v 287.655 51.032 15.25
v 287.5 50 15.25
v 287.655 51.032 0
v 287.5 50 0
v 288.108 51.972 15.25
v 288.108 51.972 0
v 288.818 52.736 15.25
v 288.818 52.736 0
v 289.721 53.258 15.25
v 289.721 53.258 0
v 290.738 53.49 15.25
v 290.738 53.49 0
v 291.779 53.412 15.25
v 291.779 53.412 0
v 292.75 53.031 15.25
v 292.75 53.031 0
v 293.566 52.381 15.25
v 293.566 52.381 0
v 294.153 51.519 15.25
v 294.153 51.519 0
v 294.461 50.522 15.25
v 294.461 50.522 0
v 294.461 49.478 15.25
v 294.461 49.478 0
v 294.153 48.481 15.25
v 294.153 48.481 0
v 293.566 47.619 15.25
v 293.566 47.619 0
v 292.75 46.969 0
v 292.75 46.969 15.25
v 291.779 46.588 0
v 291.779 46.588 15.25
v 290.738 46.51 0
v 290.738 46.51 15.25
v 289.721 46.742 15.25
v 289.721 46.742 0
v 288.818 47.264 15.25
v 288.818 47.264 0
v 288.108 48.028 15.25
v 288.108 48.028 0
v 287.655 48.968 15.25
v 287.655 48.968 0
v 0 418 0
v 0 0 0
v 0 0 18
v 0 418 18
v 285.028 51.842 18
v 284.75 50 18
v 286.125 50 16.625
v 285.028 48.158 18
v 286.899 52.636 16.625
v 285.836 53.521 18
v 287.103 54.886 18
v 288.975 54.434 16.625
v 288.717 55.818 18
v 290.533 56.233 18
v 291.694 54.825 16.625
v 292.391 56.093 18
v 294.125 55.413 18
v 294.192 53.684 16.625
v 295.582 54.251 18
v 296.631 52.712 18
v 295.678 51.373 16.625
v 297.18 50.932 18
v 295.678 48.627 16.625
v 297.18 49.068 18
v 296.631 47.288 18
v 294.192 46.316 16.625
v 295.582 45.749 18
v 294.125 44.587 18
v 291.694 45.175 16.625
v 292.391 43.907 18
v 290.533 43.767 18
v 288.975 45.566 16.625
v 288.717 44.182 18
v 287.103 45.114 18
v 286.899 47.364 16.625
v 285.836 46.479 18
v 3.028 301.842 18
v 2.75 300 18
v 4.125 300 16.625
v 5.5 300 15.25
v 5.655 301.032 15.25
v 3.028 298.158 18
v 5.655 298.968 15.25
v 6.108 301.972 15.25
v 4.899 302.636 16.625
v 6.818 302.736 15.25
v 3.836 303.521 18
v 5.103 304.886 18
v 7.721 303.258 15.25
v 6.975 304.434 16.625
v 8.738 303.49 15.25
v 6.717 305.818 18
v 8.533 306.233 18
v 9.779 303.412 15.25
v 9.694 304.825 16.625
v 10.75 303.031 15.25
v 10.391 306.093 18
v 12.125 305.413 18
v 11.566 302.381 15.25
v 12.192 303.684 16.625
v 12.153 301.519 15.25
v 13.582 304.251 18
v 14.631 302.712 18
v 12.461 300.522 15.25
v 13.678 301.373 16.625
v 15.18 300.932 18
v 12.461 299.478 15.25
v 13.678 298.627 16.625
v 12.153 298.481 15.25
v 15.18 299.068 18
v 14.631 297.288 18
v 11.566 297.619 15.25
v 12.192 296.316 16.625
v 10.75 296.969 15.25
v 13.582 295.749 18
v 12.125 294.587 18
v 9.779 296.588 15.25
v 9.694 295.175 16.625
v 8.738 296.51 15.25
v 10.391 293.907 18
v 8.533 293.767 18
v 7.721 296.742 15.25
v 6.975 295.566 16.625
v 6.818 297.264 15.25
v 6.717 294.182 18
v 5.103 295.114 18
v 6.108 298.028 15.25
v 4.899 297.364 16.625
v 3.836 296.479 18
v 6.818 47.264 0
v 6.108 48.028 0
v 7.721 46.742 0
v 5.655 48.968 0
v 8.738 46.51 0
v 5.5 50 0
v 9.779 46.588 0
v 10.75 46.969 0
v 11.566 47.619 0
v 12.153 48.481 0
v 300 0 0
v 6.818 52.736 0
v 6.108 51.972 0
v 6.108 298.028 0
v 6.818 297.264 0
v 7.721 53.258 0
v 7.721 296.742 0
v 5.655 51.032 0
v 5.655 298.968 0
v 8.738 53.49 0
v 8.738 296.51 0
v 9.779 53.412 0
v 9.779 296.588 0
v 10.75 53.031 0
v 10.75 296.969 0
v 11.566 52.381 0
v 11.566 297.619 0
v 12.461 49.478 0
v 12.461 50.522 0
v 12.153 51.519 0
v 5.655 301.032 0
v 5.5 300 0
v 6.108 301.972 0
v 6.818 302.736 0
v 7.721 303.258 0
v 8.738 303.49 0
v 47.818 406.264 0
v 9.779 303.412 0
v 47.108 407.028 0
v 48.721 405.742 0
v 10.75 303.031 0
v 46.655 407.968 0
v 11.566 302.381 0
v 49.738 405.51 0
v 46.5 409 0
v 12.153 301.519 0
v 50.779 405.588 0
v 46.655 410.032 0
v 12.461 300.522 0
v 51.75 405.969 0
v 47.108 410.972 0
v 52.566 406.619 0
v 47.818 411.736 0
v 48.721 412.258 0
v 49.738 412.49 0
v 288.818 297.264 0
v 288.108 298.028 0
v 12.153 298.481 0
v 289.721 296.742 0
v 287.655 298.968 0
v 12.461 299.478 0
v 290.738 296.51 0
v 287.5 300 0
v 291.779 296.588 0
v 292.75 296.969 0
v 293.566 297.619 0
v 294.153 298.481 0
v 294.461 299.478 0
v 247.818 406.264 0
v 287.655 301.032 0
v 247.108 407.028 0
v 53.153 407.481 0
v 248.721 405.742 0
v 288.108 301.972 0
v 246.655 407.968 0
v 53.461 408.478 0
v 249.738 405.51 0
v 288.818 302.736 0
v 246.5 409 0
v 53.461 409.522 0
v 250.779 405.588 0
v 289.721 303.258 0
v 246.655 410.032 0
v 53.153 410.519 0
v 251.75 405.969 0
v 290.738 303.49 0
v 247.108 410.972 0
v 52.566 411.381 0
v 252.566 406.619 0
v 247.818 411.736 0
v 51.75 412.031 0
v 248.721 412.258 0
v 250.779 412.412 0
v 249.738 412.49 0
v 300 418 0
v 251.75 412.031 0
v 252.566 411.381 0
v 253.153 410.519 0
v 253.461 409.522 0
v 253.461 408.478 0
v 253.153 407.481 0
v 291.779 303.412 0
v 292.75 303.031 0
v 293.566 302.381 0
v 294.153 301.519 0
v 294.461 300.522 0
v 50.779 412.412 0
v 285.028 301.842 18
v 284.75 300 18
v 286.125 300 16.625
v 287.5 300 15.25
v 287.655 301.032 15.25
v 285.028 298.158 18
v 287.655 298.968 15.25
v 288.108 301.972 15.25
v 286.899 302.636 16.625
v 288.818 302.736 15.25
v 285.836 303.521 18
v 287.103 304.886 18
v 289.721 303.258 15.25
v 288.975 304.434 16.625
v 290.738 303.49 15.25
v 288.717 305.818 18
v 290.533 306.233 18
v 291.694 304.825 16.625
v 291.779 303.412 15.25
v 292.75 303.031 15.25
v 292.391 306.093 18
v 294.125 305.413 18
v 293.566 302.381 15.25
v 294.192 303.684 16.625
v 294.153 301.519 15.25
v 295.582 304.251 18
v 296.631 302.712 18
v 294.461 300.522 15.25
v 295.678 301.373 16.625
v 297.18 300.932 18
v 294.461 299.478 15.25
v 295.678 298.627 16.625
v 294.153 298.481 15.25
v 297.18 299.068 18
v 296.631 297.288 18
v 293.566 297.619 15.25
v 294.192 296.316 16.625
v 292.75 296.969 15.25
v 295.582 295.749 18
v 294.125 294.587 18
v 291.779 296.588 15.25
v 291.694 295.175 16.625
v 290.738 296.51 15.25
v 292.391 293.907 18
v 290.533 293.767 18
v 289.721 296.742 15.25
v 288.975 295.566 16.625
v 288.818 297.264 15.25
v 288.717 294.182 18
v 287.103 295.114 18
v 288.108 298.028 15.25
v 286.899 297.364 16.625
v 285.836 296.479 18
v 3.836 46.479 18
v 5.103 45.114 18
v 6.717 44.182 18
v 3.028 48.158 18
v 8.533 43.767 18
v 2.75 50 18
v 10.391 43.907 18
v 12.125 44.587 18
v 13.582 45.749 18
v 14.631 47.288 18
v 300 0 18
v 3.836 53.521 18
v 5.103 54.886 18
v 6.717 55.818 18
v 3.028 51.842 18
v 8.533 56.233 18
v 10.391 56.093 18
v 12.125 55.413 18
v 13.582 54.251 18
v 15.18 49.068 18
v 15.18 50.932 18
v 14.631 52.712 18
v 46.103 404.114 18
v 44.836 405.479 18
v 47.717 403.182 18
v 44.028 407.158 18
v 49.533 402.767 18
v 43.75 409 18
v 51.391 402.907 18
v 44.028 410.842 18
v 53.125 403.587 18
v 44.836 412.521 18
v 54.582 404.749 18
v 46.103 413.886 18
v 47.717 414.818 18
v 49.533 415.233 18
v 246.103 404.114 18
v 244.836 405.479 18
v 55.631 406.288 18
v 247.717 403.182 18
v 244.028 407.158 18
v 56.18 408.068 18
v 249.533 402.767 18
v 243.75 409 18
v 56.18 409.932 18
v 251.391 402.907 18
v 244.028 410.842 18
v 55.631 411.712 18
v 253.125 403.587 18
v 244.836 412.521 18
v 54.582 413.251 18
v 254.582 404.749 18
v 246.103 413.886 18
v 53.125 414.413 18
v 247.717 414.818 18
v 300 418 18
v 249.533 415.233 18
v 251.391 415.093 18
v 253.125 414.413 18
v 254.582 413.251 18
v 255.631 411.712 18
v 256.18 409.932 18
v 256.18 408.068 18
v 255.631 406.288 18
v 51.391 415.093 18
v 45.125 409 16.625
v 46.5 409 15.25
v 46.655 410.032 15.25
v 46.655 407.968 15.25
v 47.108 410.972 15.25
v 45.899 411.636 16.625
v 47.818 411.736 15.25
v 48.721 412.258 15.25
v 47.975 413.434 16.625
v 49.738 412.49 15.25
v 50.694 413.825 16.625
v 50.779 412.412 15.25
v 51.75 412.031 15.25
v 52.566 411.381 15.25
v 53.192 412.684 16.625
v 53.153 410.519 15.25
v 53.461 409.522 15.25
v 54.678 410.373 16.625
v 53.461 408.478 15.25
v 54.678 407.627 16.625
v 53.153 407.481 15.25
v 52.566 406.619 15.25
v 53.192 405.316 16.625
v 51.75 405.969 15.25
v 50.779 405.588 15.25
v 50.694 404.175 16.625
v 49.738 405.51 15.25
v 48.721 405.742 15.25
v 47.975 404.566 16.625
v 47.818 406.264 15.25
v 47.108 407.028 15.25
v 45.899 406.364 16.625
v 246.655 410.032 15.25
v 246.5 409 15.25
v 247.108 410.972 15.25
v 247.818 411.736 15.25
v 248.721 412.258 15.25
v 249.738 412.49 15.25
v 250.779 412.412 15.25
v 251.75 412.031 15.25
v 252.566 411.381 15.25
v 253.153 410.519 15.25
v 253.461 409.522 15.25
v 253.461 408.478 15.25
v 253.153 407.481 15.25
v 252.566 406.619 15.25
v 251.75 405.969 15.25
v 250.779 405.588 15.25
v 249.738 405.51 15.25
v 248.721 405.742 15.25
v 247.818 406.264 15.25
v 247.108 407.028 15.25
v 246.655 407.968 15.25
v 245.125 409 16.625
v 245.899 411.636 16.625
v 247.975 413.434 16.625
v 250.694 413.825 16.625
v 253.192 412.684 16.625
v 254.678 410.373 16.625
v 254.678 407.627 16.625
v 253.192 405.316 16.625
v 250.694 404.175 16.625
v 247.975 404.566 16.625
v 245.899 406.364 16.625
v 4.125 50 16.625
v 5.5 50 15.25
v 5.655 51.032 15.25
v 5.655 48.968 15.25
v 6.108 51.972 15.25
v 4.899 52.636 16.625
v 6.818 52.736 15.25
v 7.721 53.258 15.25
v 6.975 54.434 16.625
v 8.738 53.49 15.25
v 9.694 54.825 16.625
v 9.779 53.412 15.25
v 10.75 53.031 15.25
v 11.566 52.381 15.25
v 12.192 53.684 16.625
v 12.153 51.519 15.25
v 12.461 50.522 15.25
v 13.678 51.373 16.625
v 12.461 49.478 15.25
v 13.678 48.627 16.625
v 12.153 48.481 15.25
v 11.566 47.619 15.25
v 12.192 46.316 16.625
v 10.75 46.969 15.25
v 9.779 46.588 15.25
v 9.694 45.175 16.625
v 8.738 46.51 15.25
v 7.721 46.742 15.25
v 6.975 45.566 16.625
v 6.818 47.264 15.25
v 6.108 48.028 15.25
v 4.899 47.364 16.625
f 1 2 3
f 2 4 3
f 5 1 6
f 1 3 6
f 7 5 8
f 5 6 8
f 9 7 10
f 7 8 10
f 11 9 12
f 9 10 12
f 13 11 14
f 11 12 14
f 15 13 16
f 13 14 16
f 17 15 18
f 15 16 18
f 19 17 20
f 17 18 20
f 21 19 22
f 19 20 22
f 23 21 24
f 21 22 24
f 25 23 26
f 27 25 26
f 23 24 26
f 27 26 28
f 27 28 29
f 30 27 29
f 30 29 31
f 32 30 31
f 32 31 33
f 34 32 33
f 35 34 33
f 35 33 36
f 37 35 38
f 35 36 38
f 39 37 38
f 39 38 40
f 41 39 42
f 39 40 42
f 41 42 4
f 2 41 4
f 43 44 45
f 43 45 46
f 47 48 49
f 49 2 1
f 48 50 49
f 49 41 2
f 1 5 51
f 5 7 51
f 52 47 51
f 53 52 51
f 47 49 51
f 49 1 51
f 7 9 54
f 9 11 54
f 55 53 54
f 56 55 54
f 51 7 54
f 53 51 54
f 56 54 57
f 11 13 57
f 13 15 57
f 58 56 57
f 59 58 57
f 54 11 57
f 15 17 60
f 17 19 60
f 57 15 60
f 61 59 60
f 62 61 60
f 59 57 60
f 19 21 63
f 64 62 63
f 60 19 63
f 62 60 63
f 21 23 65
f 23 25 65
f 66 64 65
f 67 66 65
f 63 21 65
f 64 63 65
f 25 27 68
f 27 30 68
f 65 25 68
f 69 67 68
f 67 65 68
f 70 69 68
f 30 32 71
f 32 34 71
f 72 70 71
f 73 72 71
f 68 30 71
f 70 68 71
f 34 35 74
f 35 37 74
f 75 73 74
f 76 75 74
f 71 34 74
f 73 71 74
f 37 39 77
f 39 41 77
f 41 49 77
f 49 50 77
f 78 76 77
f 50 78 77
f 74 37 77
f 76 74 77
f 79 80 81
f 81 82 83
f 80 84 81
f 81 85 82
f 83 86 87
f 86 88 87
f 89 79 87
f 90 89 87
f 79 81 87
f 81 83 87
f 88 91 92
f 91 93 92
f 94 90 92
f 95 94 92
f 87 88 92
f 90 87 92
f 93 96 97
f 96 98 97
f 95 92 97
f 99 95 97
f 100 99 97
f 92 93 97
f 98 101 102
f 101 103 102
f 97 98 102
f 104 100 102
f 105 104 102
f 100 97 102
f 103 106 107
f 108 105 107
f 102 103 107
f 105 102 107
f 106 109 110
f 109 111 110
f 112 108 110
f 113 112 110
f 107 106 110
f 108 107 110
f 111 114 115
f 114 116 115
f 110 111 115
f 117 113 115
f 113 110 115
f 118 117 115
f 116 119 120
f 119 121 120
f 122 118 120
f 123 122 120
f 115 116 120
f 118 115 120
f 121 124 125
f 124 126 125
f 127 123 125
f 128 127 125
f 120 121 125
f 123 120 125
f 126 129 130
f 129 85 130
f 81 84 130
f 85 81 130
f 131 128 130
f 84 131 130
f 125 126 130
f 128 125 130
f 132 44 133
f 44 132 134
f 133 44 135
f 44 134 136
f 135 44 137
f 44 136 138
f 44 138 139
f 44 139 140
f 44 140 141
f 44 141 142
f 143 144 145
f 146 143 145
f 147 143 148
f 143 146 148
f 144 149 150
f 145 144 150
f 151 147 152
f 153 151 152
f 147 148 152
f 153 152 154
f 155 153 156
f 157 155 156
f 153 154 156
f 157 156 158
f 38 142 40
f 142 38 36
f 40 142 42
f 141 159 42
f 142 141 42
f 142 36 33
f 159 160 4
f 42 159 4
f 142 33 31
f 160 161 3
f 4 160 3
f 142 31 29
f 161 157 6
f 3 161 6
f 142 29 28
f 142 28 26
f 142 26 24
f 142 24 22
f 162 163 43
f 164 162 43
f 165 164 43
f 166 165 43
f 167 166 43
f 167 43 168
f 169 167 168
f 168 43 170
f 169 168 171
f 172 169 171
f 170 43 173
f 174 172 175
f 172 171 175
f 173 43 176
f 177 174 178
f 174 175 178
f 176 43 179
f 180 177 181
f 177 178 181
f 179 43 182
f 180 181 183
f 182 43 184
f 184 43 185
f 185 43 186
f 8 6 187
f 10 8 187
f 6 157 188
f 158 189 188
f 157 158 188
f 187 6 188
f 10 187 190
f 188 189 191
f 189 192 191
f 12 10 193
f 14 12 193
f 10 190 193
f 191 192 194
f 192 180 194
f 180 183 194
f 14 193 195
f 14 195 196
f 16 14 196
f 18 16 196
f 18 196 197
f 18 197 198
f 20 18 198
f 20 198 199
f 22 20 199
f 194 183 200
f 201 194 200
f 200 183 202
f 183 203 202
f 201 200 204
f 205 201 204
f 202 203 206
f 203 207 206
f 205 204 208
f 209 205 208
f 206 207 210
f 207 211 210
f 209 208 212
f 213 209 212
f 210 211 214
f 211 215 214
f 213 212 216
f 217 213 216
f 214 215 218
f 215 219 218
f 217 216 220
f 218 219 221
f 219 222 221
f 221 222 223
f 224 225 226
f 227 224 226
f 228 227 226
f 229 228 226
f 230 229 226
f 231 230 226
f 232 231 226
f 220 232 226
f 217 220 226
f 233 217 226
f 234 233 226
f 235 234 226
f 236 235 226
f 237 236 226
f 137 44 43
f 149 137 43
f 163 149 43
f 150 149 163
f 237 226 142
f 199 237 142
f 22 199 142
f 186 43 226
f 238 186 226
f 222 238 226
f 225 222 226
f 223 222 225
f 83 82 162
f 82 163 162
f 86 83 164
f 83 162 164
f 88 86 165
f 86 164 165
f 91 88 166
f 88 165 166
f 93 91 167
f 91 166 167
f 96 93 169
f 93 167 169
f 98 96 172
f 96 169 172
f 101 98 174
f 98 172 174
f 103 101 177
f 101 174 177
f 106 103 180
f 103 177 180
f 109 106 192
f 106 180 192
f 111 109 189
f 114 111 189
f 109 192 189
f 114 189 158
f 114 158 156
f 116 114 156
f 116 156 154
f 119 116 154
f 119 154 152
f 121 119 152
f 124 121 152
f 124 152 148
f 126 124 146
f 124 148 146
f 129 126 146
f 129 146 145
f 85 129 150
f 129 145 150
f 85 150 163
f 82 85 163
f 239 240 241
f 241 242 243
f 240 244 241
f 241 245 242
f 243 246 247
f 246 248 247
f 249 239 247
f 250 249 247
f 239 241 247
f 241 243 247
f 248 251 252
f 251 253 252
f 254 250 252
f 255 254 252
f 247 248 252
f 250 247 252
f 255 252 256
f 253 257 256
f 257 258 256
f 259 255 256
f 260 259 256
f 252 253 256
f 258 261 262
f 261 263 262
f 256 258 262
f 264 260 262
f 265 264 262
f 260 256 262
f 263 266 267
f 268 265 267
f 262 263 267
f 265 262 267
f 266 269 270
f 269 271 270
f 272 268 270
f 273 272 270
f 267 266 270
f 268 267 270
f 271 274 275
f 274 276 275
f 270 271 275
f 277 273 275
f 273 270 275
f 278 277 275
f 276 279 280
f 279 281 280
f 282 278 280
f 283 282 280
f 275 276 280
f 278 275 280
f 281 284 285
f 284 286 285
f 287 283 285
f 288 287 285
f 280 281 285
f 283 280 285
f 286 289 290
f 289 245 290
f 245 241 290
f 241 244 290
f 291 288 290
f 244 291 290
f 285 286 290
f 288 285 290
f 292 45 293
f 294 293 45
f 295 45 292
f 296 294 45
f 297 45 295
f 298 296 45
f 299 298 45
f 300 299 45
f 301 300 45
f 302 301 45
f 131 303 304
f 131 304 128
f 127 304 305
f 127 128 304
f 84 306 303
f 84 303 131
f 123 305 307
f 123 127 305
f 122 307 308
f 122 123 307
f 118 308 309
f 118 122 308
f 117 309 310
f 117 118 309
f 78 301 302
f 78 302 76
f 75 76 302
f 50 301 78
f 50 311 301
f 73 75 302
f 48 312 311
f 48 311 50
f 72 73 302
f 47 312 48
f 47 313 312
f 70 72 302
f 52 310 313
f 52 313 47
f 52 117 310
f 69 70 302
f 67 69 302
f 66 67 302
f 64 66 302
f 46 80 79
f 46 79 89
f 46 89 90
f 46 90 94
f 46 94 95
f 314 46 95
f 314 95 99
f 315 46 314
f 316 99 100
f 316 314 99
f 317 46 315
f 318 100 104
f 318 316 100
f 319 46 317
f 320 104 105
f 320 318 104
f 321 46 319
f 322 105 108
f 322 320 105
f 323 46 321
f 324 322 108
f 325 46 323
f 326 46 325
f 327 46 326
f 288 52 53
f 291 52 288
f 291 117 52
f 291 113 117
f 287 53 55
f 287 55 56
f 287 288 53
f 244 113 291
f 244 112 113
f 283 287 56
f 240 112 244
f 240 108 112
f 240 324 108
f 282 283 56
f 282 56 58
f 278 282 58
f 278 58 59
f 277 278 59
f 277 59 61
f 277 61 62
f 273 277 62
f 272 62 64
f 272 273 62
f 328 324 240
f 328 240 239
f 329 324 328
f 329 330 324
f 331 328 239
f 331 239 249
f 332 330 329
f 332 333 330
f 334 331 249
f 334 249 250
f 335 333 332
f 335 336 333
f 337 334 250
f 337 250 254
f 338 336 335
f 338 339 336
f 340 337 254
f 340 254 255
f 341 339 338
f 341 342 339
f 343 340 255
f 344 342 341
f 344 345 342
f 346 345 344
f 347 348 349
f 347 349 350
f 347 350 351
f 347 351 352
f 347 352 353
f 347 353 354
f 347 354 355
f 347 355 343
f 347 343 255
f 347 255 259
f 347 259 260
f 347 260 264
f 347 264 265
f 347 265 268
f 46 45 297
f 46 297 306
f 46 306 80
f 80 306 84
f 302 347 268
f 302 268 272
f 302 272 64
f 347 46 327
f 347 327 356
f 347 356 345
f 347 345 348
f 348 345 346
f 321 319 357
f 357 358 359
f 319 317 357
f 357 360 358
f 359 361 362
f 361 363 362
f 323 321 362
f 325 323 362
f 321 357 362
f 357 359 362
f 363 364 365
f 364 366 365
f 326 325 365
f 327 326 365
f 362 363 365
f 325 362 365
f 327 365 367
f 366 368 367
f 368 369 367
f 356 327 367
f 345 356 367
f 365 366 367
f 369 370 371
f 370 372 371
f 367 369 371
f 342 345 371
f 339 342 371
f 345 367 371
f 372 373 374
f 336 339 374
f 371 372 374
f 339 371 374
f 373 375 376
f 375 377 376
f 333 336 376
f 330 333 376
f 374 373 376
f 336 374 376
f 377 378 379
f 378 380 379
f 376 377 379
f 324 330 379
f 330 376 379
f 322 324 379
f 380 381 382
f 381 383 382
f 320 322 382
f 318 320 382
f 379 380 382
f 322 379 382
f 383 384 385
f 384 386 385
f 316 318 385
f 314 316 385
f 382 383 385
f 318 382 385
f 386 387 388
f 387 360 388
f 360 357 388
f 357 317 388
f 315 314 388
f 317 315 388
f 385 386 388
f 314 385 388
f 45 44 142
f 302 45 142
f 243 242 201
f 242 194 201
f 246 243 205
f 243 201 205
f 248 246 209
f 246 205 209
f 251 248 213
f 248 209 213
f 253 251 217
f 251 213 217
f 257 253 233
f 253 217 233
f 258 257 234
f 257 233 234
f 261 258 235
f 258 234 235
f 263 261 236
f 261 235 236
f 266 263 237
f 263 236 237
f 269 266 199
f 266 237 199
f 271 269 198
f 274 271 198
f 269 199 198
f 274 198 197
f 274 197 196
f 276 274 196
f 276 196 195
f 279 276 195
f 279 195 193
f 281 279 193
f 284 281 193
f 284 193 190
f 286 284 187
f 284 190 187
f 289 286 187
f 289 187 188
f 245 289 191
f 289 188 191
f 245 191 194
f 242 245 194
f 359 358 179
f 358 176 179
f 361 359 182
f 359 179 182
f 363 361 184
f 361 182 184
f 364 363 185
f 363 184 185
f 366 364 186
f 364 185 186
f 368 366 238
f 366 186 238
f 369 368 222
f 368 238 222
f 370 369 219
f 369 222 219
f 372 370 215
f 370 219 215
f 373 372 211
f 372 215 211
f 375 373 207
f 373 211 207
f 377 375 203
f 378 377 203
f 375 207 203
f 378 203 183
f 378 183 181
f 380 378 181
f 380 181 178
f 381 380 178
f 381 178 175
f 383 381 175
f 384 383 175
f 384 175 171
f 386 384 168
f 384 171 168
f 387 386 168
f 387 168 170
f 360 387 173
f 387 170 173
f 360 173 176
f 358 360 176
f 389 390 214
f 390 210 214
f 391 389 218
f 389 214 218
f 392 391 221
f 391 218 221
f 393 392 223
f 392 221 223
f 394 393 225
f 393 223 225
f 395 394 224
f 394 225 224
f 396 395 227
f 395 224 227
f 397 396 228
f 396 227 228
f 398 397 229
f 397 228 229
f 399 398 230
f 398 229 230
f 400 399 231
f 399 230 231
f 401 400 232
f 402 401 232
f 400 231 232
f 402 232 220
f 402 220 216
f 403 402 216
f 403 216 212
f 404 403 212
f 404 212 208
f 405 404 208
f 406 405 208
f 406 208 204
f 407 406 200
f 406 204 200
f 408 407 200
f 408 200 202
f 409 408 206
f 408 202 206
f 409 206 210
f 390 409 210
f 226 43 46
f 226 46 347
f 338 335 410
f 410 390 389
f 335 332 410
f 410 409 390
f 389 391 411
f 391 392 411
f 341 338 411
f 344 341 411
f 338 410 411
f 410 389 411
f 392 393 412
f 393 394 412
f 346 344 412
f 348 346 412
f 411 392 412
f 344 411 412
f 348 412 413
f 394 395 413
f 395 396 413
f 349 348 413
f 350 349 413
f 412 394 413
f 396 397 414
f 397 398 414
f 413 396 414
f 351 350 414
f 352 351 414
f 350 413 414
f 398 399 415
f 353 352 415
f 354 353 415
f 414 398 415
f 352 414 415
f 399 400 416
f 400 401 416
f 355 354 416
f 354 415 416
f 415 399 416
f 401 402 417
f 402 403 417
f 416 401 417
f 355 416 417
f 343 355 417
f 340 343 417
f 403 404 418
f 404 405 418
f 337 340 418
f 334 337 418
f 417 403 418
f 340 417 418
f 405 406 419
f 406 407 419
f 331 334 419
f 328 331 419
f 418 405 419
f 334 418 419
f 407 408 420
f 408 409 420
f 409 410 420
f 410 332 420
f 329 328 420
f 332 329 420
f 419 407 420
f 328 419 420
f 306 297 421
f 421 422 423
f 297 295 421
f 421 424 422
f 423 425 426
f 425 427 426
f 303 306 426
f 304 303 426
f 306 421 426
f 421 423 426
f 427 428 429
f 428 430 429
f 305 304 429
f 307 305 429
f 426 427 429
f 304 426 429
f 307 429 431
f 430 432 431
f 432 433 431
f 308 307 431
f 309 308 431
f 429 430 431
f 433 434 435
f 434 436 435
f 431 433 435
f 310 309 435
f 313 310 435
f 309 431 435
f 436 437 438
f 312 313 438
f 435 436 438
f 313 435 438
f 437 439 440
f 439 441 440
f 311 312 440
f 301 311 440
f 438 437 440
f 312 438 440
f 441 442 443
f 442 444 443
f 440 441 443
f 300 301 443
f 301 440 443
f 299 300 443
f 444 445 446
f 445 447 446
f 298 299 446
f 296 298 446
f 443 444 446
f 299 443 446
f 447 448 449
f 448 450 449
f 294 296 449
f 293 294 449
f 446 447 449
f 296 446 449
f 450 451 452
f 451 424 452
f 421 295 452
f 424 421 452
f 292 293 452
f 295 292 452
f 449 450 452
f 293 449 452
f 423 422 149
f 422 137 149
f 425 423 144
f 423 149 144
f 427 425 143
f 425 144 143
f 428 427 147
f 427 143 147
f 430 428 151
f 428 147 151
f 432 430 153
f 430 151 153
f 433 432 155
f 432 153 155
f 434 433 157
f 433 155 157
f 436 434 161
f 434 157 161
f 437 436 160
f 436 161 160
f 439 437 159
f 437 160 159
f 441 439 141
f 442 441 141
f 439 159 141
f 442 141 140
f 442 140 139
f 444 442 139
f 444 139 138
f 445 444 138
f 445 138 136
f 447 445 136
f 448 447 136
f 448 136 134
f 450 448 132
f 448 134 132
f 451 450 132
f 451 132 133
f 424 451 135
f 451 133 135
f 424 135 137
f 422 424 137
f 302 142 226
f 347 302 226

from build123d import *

# Parameters (mm, degrees)
F3_W           = 300
F3_H           = 418
F0_DEPTH       = 18
F2_D           = 7
F2_CSINK_D     = 12.5
F2_CSINK_ANGLE = 90


with BuildPart() as f0:
    # F3 (on Top) → F0 (new body)
    with BuildSketch(Plane.XY):
        with Locations((150, 209)):
            Rectangle(F3_W, F3_H)
    extrude(amount=F0_DEPTH)

    # F2 (through all)
    with Locations(Plane.XY.offset(18)):
        with Locations((9, 50), (291, 50), (9, 300), (291, 300), (50, 409), (250, 409)):
            CounterSinkHole(F2_D / 2, F2_CSINK_D / 2, counter_sink_angle=F2_CSINK_ANGLE)


solid = f0.part
